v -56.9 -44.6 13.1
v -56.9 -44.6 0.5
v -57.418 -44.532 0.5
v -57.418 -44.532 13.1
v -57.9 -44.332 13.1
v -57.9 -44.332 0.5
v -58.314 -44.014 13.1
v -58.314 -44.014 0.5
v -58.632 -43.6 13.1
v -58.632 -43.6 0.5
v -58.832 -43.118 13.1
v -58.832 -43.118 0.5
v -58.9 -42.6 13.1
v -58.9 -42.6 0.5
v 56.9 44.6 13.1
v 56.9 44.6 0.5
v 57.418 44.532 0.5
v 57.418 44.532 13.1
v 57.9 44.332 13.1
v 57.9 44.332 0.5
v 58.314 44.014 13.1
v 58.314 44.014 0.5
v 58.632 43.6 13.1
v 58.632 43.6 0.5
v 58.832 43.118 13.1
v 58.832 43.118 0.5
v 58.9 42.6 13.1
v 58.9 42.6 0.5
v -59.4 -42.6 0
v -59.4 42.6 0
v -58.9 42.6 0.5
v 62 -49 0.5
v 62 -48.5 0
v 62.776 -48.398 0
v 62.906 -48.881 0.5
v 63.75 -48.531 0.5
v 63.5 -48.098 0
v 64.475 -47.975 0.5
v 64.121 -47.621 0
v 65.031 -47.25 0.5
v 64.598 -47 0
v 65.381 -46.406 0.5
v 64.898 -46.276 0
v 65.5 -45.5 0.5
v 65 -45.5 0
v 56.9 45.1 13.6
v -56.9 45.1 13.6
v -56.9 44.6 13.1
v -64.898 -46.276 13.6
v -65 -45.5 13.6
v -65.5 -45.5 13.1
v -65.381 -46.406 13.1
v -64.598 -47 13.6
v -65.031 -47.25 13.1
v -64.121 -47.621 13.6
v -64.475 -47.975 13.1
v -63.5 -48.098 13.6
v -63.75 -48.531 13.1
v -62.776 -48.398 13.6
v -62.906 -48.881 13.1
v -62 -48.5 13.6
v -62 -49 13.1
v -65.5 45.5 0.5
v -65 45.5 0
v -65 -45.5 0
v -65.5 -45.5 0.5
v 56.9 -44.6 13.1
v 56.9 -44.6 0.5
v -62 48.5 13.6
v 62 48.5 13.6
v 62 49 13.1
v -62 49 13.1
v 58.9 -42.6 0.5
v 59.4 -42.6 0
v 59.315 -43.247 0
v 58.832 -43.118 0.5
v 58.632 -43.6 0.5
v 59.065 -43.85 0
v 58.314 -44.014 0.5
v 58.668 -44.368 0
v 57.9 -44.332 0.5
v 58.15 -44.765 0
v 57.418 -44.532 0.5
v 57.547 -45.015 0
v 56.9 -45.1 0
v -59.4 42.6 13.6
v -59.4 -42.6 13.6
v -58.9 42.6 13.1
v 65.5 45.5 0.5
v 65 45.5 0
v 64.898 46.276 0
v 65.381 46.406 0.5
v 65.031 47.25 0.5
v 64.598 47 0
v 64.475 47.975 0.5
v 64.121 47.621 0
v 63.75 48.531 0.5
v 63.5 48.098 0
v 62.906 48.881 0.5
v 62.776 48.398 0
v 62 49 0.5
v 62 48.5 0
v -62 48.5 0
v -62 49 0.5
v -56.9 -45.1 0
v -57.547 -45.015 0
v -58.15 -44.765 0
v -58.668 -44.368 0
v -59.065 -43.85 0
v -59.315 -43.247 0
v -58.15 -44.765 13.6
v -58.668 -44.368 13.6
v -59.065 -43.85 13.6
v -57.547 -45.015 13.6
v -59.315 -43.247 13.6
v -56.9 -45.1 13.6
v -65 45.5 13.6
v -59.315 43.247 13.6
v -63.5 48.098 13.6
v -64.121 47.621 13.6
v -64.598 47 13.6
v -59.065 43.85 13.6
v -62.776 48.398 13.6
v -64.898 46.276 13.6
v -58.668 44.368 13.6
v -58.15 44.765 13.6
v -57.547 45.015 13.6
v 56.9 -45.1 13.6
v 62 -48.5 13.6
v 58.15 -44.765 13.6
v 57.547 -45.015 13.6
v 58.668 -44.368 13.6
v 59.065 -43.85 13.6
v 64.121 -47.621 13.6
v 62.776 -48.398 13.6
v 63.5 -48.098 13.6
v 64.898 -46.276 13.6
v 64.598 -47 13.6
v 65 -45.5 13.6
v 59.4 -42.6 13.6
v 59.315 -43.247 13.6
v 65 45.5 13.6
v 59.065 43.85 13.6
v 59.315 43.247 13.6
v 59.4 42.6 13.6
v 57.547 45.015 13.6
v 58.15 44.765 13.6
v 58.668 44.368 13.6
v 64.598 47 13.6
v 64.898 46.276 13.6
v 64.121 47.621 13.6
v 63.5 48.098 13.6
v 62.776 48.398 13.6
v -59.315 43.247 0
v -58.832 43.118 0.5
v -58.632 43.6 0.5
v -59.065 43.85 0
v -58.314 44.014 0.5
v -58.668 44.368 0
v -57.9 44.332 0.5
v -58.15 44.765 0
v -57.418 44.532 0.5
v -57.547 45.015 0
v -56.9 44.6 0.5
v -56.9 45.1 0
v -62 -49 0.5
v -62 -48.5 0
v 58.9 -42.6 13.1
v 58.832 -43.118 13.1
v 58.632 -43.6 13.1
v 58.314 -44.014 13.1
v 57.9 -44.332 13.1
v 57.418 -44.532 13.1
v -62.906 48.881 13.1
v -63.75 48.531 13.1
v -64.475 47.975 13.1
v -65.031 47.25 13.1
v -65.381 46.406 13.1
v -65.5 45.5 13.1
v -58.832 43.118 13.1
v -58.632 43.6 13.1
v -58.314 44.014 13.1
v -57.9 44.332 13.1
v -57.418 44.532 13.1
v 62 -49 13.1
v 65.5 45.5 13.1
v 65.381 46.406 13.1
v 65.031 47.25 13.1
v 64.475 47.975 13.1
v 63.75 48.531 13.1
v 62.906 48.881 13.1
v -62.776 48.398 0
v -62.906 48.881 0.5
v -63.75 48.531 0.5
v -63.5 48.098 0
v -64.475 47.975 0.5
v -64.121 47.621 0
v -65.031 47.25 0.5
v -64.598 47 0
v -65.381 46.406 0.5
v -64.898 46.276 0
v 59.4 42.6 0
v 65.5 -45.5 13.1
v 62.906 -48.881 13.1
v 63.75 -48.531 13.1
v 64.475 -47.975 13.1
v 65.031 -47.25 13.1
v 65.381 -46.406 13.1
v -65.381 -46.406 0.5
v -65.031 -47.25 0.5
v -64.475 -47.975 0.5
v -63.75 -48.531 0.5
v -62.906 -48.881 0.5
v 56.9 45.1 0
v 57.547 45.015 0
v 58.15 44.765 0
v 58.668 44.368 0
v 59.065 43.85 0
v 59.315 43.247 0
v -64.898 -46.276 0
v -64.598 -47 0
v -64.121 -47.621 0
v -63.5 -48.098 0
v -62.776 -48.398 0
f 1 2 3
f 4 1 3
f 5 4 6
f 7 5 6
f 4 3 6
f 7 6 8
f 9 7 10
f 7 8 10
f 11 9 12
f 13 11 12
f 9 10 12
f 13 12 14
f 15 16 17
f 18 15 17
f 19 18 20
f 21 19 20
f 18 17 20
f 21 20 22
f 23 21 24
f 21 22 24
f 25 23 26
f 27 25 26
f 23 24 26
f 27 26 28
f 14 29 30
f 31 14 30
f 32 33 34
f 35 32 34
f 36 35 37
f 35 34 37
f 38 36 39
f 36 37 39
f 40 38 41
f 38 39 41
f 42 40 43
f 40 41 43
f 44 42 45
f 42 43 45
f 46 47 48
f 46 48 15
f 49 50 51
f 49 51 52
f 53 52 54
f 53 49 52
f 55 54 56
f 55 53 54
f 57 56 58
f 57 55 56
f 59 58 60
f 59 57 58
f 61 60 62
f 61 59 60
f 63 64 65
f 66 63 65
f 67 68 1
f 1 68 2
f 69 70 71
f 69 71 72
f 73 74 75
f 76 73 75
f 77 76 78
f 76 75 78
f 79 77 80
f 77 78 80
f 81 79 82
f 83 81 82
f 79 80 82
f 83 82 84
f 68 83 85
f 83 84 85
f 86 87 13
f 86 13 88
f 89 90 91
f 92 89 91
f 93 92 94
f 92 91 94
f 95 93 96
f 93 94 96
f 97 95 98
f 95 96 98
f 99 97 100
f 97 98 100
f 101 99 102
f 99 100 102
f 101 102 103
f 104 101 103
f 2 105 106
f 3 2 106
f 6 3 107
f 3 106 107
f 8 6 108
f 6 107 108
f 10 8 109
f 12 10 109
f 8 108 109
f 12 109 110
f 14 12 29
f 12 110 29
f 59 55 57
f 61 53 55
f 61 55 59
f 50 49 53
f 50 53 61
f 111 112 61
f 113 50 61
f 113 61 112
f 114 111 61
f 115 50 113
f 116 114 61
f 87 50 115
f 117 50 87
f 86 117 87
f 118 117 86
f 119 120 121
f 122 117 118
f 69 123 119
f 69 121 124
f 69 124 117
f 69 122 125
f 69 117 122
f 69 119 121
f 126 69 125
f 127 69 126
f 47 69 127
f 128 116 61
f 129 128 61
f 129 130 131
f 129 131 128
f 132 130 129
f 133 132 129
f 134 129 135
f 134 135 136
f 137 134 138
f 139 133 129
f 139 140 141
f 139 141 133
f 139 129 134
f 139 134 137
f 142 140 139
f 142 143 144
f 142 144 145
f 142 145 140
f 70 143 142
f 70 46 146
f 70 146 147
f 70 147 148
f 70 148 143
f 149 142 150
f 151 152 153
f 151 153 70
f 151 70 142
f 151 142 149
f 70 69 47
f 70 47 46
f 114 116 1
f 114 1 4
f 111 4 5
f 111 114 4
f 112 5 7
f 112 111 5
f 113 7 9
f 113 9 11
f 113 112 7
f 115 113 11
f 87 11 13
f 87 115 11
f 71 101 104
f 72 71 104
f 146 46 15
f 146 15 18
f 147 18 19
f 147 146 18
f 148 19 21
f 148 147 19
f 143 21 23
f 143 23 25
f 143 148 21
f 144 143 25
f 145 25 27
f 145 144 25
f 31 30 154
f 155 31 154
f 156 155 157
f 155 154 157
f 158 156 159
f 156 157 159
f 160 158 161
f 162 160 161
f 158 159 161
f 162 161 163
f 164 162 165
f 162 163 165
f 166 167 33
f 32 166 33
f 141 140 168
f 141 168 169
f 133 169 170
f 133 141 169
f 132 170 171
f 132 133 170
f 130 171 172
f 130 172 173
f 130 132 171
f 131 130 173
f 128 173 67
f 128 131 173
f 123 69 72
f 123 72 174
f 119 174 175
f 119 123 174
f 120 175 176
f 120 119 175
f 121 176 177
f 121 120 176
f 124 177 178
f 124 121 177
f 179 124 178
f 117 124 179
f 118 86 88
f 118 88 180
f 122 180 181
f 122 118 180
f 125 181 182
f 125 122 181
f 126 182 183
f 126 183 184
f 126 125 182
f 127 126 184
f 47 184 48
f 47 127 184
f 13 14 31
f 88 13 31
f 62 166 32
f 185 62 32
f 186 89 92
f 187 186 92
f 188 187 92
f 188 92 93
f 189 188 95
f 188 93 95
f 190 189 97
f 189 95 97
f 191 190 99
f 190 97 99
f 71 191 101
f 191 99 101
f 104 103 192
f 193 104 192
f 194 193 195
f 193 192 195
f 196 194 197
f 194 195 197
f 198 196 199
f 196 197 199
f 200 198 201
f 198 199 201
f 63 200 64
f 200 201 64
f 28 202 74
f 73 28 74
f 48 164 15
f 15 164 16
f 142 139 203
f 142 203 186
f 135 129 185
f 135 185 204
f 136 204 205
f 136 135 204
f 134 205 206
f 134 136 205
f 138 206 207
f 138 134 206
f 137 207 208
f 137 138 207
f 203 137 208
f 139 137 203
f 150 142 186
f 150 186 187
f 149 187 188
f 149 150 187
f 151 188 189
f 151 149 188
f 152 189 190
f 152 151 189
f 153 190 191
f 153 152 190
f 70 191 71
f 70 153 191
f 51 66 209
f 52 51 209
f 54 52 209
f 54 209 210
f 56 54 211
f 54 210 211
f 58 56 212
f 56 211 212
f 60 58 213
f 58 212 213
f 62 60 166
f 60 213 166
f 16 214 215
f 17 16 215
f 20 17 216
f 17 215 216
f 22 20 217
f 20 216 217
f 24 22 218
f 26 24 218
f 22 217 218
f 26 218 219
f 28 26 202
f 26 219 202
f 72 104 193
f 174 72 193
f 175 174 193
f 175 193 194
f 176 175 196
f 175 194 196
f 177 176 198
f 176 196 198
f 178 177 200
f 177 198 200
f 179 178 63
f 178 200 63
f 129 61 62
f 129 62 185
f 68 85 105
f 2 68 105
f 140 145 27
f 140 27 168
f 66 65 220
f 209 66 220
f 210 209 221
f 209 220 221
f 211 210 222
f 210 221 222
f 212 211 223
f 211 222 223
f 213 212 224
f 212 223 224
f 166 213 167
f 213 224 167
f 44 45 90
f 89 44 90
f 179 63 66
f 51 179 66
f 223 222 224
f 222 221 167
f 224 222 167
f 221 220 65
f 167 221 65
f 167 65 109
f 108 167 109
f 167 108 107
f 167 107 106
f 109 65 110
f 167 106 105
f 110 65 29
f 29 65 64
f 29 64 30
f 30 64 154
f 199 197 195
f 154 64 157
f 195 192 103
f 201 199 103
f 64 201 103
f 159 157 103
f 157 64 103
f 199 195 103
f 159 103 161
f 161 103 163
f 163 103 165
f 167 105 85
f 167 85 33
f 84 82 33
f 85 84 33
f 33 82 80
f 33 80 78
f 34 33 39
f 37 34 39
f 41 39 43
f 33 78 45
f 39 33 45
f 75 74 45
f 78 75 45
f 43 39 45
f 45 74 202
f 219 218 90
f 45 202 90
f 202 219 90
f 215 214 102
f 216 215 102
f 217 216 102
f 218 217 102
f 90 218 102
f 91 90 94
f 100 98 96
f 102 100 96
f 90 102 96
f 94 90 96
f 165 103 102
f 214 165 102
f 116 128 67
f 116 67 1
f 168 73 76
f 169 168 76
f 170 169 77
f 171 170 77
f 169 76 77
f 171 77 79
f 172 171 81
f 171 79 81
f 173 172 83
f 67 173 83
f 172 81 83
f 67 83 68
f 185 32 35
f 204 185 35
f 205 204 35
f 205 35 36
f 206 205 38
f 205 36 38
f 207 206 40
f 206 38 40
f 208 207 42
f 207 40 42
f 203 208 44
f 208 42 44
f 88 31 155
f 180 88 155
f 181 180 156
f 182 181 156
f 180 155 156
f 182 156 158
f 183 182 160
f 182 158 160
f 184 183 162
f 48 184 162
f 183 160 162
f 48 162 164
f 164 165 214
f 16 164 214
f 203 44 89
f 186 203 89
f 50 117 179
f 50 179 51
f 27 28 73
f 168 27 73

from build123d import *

# Parameters (mm, degrees)
BOSS_EXTRUDE1_DEPTH = 13.6
DEBURS_SIZE         = 0.5


with BuildPart() as part:
    # Sketch1 → Boss-Extrude1 (new body)
    with BuildSketch(Plane.XY):
        with BuildLine():
            Line((-65.5, 45.5), (-65.5, -45.5))
            ThreePointArc((-65.5, -45.5), (-64.474873734, -47.974873734), (-62, -49))
            Line((-62, -49), (62, -49))
            ThreePointArc((62, -49), (64.474873734, -47.974873734), (65.5, -45.5))
            Line((65.5, -45.5), (65.5, 45.5))
            ThreePointArc((65.5, 45.5), (64.474873734, 47.974873734), (62, 49))
            Line((62, 49), (-62, 49))
            ThreePointArc((-62, 49), (-64.474873734, 47.974873734), (-65.5, 45.5))
        make_face()
        with BuildLine():
            Line((-56.9, 44.6), (56.9, 44.6))
            ThreePointArc((56.9, 44.6), (58.314213562, 44.014213562), (58.9, 42.6))
            Line((58.9, 42.6), (58.9, -42.6))
            ThreePointArc((58.9, -42.6), (58.314213562, -44.014213562), (56.9, -44.6))
            Line((56.9, -44.6), (-56.9, -44.6))
            ThreePointArc((-56.9, -44.6), (-58.314213562, -44.014213562), (-58.9, -42.6))
            Line((-58.9, -42.6), (-58.9, 42.6))
            ThreePointArc((-58.9, 42.6), (-58.314213562, 44.014213562), (-56.9, 44.6))
        make_face(mode=Mode.SUBTRACT)
    extrude(amount=BOSS_EXTRUDE1_DEPTH)

    # Deburs
    deburs_edges = [part.edges().sort_by_distance(p)[0] for p in [
        (58.314213562, 44.014213562, 0),
        (0, 44.6, 0),
        (-58.314213562, 44.014213562, 0),
        (-58.9, 0, 0),
        (-58.314213562, -44.014213562, 0),
        (0, -44.6, 0),
        (-64.474873734, 47.974873734, 13.6),
        (-64.474873734, 47.974873734, 0),
        (-65.5, 0, 13.6),
        (-65.5, 0, 0),
        (-64.474873734, -47.974873734, 13.6),
        (-64.474873734, -47.974873734, 0),
        (0, -49, 13.6),
        (0, -49, 0),
        (64.474873734, -47.974873734, 13.6),
        (64.474873734, -47.974873734, 0),
        (65.5, 0, 13.6),
        (65.5, 0, 0),
        (58.314213562, -44.014213562, 0),
        (64.474873734, 47.974873734, 13.6),
        (64.474873734, 47.974873734, 0),
        (0, 49, 13.6),
        (0, 49, 0),
        (58.314213562, -44.014213562, 13.6),
        (0, -44.6, 13.6),
        (-58.314213562, -44.014213562, 13.6),
        (-58.9, 0, 13.6),
        (-58.314213562, 44.014213562, 13.6),
        (0, 44.6, 13.6),
        (58.314213562, 44.014213562, 13.6),
        (58.9, 0, 13.6),
        (58.9, 0, 0),
    ]]
    chamfer(deburs_edges, length=DEBURS_SIZE)


solid = part.part
